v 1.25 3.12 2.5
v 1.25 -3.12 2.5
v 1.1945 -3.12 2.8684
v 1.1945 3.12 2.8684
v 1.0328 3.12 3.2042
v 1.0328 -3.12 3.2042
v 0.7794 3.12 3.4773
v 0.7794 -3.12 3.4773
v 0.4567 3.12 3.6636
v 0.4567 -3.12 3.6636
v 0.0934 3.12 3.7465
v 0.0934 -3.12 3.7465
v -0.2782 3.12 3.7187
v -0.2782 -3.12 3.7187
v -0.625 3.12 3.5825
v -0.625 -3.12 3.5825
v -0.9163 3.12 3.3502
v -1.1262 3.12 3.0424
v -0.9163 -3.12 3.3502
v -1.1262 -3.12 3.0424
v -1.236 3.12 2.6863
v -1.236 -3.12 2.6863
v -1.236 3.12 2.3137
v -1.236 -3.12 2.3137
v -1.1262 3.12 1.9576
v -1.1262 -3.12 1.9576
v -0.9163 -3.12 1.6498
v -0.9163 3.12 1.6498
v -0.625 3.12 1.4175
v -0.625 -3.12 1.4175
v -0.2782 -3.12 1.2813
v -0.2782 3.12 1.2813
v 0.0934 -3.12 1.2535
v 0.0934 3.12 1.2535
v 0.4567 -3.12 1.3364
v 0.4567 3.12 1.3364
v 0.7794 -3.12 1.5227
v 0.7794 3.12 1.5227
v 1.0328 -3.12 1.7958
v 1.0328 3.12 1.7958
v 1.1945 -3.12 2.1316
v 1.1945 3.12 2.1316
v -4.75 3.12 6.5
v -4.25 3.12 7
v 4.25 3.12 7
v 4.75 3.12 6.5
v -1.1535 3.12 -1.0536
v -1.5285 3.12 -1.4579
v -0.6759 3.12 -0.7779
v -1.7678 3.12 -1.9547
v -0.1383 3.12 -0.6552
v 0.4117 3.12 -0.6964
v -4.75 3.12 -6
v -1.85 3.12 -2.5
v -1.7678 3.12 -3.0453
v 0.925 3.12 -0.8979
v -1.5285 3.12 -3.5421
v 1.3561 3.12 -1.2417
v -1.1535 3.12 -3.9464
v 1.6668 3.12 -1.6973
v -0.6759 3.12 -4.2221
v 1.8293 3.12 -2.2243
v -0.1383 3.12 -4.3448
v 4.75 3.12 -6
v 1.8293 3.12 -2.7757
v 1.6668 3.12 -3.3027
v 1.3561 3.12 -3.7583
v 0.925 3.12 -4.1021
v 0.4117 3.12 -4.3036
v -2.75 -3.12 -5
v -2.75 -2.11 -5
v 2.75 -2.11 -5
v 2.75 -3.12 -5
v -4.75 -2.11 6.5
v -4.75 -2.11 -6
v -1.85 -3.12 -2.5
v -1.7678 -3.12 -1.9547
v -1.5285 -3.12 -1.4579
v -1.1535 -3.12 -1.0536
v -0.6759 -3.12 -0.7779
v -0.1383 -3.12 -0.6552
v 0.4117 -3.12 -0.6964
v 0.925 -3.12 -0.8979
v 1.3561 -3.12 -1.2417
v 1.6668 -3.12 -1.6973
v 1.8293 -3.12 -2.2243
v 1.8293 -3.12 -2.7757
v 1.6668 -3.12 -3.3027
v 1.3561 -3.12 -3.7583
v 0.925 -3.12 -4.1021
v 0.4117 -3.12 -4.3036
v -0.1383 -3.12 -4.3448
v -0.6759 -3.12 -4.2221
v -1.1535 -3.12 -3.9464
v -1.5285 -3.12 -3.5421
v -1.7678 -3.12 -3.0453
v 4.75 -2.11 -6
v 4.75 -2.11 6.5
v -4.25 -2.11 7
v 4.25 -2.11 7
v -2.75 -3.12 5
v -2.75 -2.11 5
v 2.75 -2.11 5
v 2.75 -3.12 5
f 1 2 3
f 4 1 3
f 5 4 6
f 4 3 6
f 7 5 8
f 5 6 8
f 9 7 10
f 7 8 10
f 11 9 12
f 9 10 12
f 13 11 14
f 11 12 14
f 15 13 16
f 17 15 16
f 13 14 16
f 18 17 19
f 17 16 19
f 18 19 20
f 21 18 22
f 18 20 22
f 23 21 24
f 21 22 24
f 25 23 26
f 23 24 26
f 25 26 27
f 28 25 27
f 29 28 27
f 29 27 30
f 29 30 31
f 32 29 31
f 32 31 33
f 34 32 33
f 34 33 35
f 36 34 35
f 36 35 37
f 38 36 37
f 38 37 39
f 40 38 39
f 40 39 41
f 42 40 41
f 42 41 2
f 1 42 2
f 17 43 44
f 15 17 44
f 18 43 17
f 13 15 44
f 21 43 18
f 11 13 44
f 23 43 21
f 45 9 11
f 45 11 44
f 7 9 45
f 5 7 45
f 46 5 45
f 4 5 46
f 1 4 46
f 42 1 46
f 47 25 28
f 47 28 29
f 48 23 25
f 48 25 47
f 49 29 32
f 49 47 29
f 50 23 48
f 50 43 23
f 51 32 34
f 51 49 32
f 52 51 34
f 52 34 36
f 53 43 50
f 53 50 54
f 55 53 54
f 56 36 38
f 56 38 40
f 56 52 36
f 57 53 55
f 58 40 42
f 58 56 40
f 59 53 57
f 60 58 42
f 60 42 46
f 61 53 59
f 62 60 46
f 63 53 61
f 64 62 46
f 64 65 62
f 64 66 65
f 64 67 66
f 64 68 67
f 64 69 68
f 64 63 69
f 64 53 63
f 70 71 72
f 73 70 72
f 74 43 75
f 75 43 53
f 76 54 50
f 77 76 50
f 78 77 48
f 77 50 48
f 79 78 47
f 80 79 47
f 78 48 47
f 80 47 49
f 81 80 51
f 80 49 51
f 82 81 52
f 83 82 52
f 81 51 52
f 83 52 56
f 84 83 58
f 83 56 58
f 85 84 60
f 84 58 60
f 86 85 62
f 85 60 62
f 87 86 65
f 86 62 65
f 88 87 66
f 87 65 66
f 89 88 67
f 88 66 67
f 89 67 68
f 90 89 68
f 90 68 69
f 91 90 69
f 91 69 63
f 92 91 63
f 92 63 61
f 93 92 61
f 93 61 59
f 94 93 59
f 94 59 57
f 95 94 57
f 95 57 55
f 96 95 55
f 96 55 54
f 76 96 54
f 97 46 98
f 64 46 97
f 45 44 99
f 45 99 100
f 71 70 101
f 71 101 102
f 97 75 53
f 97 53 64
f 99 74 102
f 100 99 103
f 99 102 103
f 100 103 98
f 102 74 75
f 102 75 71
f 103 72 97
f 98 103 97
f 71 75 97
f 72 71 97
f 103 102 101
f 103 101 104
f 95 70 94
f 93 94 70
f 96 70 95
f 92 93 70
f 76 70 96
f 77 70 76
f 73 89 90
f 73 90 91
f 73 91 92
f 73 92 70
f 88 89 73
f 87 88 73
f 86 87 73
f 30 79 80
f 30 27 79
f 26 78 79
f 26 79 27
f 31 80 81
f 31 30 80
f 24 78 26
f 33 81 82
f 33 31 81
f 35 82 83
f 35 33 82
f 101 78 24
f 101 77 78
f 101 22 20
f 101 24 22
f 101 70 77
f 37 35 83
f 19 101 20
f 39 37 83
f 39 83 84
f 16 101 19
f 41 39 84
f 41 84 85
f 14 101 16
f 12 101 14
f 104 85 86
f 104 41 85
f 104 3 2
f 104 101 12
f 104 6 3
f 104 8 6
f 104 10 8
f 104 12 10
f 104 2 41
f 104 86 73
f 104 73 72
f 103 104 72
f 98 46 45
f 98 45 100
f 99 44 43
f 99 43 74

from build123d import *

# Parameters (mm, degrees)
SKETCH1_W                  = 5.5
SKETCH1_H                  = 6.24
EXTRUDE1_DEPTH             = 5
SKETCH6_W                  = 9.5
SKETCH6_H                  = 14
EXTRUDE2_DEPTH             = 5.23
F_3_7_3_7_DIAMETER_HOLE1_D = 3.7
SKETCH3_R                  = 1.25
CUT_EXTRUDE1_DEPTH         = 7.24
CHAMFER2_SIZE              = 0.5
SKETCH8_W                  = 9.5
SKETCH8_H                  = 1
EXTRUDE4_DEPTH             = 7.24


with BuildPart() as part:
    # Sketch1 → Extrude1 (new body, symmetric)
    with BuildSketch(Plane.XY):
        Rectangle(SKETCH1_W, SKETCH1_H)
    extrude(amount=EXTRUDE1_DEPTH, both=True)

    # Sketch6 → Extrude2 (add)
    with BuildSketch(Plane(origin=(0, 3.12, 0), x_dir=(1, 0, 0), z_dir=(0, 1, 0))):
        Rectangle(SKETCH6_W, SKETCH6_H)
    extrude(amount=-EXTRUDE2_DEPTH)

    # 3.7 _3.7_ Diameter Hole1 (through all)
    with Locations(Plane(origin=(0.72811331, -3.12, 5.297514906), x_dir=(1, 0, 0), z_dir=(0, -1, 0))):
        with Locations((-0.72811331, -7.797514906)):
            Hole(F_3_7_3_7_DIAMETER_HOLE1_D / 2)

    # Sketch3 → Cut-Extrude1 (cut, through all)
    with BuildSketch(Plane(origin=(0, -3.12, 0), x_dir=(-1, 0, 0), z_dir=(0, -1, 0))):
        with Locations(Location((0, -2.5, 0), (0, 0, 180))):  # turned: the seam where the file's is
            Circle(SKETCH3_R)
    extrude(amount=-CUT_EXTRUDE1_DEPTH, mode=Mode.SUBTRACT)

    # Chamfer2
    chamfer2_edges = [part.edges().sort_by_distance(p)[0] for p in [
        (4.75, 0.505, 7),
        (-4.75, 0.505, 7),
    ]]
    chamfer(chamfer2_edges, length=CHAMFER2_SIZE)

    # Sketch8 → Extrude4 (cut, through all)
    with BuildSketch(Plane.XZ.offset(3.12)):
        with Locations((0, -6.5)):
            Rectangle(SKETCH8_W, SKETCH8_H)
    extrude(amount=-EXTRUDE4_DEPTH, mode=Mode.SUBTRACT)


solid = part.part
